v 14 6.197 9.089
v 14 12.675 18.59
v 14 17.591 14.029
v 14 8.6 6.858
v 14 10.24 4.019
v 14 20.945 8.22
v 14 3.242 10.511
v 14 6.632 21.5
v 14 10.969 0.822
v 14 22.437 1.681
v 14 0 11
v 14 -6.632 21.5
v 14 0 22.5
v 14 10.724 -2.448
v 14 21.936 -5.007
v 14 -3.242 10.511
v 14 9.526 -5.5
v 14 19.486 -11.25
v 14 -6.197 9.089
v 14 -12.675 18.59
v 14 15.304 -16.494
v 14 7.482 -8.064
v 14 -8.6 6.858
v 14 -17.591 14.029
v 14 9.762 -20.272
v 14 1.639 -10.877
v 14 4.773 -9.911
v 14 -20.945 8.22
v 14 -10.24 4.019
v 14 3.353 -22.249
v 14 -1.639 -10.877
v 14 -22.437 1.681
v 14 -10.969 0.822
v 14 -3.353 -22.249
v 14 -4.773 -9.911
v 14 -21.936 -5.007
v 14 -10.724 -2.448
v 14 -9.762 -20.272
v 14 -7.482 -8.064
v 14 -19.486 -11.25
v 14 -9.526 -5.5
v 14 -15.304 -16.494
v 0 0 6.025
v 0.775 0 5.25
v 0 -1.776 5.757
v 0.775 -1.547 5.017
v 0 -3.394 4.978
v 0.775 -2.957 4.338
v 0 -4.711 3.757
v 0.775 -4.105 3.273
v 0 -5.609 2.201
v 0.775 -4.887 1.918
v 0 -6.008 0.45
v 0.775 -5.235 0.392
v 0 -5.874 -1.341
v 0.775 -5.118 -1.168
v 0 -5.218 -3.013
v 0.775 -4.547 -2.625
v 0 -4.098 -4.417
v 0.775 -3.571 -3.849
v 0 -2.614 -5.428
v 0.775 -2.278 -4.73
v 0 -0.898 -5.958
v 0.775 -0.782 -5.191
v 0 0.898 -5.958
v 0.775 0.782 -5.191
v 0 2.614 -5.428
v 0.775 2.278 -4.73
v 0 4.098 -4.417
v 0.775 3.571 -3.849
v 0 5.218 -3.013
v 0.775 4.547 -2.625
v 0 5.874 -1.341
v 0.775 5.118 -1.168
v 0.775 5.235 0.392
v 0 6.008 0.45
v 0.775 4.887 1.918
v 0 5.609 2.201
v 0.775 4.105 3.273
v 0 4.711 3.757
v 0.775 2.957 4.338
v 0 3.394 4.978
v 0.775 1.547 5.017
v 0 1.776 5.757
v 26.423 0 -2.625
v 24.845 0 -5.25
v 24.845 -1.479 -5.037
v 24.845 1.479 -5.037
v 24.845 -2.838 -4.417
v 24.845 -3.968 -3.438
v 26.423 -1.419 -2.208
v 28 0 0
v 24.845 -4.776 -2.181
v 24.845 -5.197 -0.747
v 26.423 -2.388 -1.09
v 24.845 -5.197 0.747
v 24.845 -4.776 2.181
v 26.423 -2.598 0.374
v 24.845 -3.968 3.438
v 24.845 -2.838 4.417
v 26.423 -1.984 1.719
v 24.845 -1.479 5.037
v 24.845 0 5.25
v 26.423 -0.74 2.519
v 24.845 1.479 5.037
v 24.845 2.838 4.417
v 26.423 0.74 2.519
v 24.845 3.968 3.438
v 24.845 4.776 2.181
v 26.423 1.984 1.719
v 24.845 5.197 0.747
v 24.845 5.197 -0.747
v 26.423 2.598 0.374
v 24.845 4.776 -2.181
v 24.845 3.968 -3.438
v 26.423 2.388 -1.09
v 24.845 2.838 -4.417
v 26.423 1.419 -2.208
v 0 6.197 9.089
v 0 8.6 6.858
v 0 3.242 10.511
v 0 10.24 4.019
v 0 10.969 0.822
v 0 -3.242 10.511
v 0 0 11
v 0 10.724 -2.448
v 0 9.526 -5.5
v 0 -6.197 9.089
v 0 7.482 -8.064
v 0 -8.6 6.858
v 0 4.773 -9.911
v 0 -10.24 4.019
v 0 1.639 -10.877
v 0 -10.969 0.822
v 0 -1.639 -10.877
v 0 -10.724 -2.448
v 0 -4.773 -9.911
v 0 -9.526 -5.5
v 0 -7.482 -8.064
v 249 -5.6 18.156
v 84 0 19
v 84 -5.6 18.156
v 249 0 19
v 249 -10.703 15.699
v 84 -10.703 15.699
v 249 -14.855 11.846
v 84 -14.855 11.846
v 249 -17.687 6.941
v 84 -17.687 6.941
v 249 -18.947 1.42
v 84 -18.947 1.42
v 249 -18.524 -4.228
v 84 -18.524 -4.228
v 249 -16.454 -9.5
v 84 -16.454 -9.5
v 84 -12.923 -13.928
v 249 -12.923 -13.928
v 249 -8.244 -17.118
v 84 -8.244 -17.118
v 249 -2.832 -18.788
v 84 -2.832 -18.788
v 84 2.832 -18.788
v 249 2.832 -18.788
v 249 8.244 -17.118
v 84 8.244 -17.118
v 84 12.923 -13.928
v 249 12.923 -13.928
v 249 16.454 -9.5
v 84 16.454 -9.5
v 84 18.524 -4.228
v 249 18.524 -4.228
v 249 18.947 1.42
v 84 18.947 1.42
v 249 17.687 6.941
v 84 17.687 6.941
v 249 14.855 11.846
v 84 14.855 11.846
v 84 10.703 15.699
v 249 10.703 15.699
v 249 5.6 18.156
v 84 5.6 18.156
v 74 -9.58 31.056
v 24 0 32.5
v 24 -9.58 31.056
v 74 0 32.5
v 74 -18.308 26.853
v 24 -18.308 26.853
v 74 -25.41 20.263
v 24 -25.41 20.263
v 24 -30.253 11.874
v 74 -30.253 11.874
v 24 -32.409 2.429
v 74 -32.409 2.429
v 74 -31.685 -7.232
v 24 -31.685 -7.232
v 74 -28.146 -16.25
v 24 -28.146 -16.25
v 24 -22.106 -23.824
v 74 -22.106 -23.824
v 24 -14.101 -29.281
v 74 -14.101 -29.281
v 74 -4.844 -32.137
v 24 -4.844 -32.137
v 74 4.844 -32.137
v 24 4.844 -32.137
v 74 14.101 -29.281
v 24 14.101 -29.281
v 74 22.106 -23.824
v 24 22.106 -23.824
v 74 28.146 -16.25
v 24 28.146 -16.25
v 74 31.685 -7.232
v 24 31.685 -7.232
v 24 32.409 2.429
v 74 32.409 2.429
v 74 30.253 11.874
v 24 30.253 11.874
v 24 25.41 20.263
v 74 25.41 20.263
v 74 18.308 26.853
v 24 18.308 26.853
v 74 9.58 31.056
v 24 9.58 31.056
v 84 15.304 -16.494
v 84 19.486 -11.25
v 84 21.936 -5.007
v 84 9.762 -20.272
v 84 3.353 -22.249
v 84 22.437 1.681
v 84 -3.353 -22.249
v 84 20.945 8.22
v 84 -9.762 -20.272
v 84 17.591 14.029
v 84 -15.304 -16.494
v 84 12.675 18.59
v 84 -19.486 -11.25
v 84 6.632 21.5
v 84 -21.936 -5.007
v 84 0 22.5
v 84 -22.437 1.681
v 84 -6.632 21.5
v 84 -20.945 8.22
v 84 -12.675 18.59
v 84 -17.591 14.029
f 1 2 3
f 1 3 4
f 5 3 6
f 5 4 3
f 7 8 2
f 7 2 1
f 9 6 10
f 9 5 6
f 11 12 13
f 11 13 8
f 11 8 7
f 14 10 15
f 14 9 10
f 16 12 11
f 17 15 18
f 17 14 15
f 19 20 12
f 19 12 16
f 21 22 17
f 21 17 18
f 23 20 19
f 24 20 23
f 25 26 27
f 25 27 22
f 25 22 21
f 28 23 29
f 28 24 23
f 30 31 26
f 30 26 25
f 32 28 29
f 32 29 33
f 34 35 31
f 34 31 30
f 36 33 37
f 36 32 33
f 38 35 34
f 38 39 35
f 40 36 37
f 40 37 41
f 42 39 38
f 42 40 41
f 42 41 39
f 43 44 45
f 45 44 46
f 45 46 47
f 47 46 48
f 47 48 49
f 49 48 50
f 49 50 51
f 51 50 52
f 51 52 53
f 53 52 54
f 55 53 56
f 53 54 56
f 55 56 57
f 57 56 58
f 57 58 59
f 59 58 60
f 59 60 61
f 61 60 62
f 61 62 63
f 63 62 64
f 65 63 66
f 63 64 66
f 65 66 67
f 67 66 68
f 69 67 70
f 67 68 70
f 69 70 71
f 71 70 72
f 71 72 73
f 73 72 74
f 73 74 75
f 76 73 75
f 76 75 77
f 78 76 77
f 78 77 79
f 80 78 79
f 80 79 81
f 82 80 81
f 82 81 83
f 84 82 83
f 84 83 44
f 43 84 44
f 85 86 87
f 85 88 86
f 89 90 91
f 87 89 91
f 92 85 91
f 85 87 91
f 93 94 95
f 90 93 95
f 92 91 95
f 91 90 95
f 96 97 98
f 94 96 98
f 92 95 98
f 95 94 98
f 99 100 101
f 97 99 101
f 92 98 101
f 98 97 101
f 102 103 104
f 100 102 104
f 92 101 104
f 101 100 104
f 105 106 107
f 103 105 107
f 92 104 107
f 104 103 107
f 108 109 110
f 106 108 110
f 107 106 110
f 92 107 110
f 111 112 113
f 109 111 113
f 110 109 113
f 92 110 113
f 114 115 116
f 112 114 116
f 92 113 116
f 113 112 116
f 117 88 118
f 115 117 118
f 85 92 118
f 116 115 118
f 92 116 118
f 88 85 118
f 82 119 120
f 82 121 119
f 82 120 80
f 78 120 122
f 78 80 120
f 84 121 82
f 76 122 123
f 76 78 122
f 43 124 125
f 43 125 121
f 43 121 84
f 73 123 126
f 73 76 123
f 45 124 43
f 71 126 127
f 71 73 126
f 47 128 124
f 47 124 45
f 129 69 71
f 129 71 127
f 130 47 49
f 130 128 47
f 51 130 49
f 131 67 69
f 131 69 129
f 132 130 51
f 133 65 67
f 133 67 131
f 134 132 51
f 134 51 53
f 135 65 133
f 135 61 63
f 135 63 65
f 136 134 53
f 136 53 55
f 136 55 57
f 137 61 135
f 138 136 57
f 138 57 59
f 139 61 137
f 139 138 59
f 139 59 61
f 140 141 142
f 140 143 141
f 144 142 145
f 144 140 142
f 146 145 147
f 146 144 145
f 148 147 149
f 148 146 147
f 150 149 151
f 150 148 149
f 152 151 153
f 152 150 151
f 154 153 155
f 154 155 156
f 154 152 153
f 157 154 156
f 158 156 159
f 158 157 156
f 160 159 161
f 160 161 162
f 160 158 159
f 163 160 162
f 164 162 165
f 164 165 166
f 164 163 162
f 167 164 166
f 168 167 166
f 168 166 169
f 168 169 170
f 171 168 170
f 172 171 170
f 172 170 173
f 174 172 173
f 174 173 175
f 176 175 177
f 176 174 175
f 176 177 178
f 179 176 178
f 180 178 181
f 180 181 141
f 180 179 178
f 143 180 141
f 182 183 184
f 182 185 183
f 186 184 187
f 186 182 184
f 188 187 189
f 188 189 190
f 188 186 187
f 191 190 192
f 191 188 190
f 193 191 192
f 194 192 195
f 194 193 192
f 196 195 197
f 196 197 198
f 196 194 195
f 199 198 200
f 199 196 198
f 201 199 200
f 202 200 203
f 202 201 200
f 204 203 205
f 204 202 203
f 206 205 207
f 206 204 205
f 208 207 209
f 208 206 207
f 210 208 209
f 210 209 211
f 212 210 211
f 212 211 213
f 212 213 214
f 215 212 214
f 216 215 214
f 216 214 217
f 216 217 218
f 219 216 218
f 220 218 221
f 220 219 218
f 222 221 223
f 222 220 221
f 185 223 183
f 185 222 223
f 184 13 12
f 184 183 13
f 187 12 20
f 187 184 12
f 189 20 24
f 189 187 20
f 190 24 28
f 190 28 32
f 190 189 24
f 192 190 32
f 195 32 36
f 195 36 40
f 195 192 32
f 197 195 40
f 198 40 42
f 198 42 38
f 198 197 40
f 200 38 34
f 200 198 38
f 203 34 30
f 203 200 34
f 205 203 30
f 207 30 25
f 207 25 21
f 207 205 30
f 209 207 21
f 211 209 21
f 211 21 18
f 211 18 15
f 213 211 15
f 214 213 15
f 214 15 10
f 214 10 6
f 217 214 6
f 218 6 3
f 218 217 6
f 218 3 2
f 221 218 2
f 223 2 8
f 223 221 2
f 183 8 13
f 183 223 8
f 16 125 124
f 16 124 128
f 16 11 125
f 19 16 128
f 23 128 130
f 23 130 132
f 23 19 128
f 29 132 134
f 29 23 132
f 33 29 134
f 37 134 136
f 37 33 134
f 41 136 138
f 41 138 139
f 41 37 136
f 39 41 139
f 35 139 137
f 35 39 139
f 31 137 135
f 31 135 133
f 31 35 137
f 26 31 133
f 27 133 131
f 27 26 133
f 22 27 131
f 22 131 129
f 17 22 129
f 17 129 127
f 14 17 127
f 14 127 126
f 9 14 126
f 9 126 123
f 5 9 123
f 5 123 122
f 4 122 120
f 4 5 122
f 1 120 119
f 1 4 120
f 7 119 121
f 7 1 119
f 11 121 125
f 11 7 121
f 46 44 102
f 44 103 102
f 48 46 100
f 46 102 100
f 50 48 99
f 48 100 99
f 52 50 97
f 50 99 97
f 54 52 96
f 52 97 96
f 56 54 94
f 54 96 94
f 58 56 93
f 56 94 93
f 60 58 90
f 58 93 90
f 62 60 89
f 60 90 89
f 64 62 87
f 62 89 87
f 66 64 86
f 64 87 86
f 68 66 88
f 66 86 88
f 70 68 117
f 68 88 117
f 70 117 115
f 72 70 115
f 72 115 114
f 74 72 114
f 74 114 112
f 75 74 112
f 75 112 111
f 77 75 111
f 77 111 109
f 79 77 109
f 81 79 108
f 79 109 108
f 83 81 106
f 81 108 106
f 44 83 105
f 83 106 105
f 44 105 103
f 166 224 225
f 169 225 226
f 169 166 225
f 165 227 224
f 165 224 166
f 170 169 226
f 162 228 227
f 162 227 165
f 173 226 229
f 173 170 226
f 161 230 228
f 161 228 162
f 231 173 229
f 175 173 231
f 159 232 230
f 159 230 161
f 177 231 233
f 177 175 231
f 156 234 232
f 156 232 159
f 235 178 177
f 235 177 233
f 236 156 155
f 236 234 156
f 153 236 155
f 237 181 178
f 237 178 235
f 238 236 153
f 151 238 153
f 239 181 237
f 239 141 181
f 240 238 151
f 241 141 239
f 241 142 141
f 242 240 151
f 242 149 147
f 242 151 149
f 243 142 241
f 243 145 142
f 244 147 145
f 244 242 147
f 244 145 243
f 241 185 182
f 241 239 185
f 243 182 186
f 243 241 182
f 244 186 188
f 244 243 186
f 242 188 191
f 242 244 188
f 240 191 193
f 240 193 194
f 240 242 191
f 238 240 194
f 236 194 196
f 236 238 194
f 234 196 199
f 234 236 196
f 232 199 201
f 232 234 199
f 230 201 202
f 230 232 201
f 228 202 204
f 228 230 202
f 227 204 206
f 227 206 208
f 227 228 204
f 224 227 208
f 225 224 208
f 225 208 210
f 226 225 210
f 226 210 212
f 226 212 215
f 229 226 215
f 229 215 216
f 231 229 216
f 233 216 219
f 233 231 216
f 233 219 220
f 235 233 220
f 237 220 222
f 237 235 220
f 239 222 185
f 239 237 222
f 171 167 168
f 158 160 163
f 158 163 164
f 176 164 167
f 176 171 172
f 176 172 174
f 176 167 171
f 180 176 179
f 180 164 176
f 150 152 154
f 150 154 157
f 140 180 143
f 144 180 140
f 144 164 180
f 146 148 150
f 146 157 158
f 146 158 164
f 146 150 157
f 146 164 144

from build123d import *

# Parameters (mm, degrees)
M12X1_5_TAPPED_HOLE1_D           = 10.5
M12X1_5_TAPPED_HOLE1_DEPTH       = 24.84548175
M12X1_5_TAPPED_HOLE1_CSINK_D     = 12.05
M12X1_5_TAPPED_HOLE1_CSINK_ANGLE = 90
M12X1_5_TAPPED_HOLE1_TIP         = 3.15451825


with BuildPart() as part:
    # Sketch1 → Revolve1 (revolve)
    with BuildSketch(Plane.XY, mode=Mode.PRIVATE) as revolve1_sk:
        Polygon((0, 11), (14, 11), (14, 22.5), (24, 32.5), (74, 32.5), (84, 22.5), (84, 19), (249, 19), (249, 0), (0, 0), align=None)
    revolve(revolve1_sk.sketch.rotate(Axis((0, 0, 0), (1, 0, 0)), 90), axis=Axis((0, 0, 0), (1, 0, 0)))

    # M12x1.5 Tapped Hole1
    with Locations(Plane(origin=(0, 0, 0), x_dir=(0, 0, -1), z_dir=(-1, 0, 0))):
        with Locations((0, 0)):
            CounterSinkHole(M12X1_5_TAPPED_HOLE1_D / 2, M12X1_5_TAPPED_HOLE1_CSINK_D / 2, depth=M12X1_5_TAPPED_HOLE1_DEPTH, counter_sink_angle=M12X1_5_TAPPED_HOLE1_CSINK_ANGLE)
            with Locations((0, 0, -(M12X1_5_TAPPED_HOLE1_DEPTH + M12X1_5_TAPPED_HOLE1_TIP / 2))):  # 118° drill point
                Cone(0, M12X1_5_TAPPED_HOLE1_D / 2, M12X1_5_TAPPED_HOLE1_TIP, mode=Mode.SUBTRACT)


solid = part.part
